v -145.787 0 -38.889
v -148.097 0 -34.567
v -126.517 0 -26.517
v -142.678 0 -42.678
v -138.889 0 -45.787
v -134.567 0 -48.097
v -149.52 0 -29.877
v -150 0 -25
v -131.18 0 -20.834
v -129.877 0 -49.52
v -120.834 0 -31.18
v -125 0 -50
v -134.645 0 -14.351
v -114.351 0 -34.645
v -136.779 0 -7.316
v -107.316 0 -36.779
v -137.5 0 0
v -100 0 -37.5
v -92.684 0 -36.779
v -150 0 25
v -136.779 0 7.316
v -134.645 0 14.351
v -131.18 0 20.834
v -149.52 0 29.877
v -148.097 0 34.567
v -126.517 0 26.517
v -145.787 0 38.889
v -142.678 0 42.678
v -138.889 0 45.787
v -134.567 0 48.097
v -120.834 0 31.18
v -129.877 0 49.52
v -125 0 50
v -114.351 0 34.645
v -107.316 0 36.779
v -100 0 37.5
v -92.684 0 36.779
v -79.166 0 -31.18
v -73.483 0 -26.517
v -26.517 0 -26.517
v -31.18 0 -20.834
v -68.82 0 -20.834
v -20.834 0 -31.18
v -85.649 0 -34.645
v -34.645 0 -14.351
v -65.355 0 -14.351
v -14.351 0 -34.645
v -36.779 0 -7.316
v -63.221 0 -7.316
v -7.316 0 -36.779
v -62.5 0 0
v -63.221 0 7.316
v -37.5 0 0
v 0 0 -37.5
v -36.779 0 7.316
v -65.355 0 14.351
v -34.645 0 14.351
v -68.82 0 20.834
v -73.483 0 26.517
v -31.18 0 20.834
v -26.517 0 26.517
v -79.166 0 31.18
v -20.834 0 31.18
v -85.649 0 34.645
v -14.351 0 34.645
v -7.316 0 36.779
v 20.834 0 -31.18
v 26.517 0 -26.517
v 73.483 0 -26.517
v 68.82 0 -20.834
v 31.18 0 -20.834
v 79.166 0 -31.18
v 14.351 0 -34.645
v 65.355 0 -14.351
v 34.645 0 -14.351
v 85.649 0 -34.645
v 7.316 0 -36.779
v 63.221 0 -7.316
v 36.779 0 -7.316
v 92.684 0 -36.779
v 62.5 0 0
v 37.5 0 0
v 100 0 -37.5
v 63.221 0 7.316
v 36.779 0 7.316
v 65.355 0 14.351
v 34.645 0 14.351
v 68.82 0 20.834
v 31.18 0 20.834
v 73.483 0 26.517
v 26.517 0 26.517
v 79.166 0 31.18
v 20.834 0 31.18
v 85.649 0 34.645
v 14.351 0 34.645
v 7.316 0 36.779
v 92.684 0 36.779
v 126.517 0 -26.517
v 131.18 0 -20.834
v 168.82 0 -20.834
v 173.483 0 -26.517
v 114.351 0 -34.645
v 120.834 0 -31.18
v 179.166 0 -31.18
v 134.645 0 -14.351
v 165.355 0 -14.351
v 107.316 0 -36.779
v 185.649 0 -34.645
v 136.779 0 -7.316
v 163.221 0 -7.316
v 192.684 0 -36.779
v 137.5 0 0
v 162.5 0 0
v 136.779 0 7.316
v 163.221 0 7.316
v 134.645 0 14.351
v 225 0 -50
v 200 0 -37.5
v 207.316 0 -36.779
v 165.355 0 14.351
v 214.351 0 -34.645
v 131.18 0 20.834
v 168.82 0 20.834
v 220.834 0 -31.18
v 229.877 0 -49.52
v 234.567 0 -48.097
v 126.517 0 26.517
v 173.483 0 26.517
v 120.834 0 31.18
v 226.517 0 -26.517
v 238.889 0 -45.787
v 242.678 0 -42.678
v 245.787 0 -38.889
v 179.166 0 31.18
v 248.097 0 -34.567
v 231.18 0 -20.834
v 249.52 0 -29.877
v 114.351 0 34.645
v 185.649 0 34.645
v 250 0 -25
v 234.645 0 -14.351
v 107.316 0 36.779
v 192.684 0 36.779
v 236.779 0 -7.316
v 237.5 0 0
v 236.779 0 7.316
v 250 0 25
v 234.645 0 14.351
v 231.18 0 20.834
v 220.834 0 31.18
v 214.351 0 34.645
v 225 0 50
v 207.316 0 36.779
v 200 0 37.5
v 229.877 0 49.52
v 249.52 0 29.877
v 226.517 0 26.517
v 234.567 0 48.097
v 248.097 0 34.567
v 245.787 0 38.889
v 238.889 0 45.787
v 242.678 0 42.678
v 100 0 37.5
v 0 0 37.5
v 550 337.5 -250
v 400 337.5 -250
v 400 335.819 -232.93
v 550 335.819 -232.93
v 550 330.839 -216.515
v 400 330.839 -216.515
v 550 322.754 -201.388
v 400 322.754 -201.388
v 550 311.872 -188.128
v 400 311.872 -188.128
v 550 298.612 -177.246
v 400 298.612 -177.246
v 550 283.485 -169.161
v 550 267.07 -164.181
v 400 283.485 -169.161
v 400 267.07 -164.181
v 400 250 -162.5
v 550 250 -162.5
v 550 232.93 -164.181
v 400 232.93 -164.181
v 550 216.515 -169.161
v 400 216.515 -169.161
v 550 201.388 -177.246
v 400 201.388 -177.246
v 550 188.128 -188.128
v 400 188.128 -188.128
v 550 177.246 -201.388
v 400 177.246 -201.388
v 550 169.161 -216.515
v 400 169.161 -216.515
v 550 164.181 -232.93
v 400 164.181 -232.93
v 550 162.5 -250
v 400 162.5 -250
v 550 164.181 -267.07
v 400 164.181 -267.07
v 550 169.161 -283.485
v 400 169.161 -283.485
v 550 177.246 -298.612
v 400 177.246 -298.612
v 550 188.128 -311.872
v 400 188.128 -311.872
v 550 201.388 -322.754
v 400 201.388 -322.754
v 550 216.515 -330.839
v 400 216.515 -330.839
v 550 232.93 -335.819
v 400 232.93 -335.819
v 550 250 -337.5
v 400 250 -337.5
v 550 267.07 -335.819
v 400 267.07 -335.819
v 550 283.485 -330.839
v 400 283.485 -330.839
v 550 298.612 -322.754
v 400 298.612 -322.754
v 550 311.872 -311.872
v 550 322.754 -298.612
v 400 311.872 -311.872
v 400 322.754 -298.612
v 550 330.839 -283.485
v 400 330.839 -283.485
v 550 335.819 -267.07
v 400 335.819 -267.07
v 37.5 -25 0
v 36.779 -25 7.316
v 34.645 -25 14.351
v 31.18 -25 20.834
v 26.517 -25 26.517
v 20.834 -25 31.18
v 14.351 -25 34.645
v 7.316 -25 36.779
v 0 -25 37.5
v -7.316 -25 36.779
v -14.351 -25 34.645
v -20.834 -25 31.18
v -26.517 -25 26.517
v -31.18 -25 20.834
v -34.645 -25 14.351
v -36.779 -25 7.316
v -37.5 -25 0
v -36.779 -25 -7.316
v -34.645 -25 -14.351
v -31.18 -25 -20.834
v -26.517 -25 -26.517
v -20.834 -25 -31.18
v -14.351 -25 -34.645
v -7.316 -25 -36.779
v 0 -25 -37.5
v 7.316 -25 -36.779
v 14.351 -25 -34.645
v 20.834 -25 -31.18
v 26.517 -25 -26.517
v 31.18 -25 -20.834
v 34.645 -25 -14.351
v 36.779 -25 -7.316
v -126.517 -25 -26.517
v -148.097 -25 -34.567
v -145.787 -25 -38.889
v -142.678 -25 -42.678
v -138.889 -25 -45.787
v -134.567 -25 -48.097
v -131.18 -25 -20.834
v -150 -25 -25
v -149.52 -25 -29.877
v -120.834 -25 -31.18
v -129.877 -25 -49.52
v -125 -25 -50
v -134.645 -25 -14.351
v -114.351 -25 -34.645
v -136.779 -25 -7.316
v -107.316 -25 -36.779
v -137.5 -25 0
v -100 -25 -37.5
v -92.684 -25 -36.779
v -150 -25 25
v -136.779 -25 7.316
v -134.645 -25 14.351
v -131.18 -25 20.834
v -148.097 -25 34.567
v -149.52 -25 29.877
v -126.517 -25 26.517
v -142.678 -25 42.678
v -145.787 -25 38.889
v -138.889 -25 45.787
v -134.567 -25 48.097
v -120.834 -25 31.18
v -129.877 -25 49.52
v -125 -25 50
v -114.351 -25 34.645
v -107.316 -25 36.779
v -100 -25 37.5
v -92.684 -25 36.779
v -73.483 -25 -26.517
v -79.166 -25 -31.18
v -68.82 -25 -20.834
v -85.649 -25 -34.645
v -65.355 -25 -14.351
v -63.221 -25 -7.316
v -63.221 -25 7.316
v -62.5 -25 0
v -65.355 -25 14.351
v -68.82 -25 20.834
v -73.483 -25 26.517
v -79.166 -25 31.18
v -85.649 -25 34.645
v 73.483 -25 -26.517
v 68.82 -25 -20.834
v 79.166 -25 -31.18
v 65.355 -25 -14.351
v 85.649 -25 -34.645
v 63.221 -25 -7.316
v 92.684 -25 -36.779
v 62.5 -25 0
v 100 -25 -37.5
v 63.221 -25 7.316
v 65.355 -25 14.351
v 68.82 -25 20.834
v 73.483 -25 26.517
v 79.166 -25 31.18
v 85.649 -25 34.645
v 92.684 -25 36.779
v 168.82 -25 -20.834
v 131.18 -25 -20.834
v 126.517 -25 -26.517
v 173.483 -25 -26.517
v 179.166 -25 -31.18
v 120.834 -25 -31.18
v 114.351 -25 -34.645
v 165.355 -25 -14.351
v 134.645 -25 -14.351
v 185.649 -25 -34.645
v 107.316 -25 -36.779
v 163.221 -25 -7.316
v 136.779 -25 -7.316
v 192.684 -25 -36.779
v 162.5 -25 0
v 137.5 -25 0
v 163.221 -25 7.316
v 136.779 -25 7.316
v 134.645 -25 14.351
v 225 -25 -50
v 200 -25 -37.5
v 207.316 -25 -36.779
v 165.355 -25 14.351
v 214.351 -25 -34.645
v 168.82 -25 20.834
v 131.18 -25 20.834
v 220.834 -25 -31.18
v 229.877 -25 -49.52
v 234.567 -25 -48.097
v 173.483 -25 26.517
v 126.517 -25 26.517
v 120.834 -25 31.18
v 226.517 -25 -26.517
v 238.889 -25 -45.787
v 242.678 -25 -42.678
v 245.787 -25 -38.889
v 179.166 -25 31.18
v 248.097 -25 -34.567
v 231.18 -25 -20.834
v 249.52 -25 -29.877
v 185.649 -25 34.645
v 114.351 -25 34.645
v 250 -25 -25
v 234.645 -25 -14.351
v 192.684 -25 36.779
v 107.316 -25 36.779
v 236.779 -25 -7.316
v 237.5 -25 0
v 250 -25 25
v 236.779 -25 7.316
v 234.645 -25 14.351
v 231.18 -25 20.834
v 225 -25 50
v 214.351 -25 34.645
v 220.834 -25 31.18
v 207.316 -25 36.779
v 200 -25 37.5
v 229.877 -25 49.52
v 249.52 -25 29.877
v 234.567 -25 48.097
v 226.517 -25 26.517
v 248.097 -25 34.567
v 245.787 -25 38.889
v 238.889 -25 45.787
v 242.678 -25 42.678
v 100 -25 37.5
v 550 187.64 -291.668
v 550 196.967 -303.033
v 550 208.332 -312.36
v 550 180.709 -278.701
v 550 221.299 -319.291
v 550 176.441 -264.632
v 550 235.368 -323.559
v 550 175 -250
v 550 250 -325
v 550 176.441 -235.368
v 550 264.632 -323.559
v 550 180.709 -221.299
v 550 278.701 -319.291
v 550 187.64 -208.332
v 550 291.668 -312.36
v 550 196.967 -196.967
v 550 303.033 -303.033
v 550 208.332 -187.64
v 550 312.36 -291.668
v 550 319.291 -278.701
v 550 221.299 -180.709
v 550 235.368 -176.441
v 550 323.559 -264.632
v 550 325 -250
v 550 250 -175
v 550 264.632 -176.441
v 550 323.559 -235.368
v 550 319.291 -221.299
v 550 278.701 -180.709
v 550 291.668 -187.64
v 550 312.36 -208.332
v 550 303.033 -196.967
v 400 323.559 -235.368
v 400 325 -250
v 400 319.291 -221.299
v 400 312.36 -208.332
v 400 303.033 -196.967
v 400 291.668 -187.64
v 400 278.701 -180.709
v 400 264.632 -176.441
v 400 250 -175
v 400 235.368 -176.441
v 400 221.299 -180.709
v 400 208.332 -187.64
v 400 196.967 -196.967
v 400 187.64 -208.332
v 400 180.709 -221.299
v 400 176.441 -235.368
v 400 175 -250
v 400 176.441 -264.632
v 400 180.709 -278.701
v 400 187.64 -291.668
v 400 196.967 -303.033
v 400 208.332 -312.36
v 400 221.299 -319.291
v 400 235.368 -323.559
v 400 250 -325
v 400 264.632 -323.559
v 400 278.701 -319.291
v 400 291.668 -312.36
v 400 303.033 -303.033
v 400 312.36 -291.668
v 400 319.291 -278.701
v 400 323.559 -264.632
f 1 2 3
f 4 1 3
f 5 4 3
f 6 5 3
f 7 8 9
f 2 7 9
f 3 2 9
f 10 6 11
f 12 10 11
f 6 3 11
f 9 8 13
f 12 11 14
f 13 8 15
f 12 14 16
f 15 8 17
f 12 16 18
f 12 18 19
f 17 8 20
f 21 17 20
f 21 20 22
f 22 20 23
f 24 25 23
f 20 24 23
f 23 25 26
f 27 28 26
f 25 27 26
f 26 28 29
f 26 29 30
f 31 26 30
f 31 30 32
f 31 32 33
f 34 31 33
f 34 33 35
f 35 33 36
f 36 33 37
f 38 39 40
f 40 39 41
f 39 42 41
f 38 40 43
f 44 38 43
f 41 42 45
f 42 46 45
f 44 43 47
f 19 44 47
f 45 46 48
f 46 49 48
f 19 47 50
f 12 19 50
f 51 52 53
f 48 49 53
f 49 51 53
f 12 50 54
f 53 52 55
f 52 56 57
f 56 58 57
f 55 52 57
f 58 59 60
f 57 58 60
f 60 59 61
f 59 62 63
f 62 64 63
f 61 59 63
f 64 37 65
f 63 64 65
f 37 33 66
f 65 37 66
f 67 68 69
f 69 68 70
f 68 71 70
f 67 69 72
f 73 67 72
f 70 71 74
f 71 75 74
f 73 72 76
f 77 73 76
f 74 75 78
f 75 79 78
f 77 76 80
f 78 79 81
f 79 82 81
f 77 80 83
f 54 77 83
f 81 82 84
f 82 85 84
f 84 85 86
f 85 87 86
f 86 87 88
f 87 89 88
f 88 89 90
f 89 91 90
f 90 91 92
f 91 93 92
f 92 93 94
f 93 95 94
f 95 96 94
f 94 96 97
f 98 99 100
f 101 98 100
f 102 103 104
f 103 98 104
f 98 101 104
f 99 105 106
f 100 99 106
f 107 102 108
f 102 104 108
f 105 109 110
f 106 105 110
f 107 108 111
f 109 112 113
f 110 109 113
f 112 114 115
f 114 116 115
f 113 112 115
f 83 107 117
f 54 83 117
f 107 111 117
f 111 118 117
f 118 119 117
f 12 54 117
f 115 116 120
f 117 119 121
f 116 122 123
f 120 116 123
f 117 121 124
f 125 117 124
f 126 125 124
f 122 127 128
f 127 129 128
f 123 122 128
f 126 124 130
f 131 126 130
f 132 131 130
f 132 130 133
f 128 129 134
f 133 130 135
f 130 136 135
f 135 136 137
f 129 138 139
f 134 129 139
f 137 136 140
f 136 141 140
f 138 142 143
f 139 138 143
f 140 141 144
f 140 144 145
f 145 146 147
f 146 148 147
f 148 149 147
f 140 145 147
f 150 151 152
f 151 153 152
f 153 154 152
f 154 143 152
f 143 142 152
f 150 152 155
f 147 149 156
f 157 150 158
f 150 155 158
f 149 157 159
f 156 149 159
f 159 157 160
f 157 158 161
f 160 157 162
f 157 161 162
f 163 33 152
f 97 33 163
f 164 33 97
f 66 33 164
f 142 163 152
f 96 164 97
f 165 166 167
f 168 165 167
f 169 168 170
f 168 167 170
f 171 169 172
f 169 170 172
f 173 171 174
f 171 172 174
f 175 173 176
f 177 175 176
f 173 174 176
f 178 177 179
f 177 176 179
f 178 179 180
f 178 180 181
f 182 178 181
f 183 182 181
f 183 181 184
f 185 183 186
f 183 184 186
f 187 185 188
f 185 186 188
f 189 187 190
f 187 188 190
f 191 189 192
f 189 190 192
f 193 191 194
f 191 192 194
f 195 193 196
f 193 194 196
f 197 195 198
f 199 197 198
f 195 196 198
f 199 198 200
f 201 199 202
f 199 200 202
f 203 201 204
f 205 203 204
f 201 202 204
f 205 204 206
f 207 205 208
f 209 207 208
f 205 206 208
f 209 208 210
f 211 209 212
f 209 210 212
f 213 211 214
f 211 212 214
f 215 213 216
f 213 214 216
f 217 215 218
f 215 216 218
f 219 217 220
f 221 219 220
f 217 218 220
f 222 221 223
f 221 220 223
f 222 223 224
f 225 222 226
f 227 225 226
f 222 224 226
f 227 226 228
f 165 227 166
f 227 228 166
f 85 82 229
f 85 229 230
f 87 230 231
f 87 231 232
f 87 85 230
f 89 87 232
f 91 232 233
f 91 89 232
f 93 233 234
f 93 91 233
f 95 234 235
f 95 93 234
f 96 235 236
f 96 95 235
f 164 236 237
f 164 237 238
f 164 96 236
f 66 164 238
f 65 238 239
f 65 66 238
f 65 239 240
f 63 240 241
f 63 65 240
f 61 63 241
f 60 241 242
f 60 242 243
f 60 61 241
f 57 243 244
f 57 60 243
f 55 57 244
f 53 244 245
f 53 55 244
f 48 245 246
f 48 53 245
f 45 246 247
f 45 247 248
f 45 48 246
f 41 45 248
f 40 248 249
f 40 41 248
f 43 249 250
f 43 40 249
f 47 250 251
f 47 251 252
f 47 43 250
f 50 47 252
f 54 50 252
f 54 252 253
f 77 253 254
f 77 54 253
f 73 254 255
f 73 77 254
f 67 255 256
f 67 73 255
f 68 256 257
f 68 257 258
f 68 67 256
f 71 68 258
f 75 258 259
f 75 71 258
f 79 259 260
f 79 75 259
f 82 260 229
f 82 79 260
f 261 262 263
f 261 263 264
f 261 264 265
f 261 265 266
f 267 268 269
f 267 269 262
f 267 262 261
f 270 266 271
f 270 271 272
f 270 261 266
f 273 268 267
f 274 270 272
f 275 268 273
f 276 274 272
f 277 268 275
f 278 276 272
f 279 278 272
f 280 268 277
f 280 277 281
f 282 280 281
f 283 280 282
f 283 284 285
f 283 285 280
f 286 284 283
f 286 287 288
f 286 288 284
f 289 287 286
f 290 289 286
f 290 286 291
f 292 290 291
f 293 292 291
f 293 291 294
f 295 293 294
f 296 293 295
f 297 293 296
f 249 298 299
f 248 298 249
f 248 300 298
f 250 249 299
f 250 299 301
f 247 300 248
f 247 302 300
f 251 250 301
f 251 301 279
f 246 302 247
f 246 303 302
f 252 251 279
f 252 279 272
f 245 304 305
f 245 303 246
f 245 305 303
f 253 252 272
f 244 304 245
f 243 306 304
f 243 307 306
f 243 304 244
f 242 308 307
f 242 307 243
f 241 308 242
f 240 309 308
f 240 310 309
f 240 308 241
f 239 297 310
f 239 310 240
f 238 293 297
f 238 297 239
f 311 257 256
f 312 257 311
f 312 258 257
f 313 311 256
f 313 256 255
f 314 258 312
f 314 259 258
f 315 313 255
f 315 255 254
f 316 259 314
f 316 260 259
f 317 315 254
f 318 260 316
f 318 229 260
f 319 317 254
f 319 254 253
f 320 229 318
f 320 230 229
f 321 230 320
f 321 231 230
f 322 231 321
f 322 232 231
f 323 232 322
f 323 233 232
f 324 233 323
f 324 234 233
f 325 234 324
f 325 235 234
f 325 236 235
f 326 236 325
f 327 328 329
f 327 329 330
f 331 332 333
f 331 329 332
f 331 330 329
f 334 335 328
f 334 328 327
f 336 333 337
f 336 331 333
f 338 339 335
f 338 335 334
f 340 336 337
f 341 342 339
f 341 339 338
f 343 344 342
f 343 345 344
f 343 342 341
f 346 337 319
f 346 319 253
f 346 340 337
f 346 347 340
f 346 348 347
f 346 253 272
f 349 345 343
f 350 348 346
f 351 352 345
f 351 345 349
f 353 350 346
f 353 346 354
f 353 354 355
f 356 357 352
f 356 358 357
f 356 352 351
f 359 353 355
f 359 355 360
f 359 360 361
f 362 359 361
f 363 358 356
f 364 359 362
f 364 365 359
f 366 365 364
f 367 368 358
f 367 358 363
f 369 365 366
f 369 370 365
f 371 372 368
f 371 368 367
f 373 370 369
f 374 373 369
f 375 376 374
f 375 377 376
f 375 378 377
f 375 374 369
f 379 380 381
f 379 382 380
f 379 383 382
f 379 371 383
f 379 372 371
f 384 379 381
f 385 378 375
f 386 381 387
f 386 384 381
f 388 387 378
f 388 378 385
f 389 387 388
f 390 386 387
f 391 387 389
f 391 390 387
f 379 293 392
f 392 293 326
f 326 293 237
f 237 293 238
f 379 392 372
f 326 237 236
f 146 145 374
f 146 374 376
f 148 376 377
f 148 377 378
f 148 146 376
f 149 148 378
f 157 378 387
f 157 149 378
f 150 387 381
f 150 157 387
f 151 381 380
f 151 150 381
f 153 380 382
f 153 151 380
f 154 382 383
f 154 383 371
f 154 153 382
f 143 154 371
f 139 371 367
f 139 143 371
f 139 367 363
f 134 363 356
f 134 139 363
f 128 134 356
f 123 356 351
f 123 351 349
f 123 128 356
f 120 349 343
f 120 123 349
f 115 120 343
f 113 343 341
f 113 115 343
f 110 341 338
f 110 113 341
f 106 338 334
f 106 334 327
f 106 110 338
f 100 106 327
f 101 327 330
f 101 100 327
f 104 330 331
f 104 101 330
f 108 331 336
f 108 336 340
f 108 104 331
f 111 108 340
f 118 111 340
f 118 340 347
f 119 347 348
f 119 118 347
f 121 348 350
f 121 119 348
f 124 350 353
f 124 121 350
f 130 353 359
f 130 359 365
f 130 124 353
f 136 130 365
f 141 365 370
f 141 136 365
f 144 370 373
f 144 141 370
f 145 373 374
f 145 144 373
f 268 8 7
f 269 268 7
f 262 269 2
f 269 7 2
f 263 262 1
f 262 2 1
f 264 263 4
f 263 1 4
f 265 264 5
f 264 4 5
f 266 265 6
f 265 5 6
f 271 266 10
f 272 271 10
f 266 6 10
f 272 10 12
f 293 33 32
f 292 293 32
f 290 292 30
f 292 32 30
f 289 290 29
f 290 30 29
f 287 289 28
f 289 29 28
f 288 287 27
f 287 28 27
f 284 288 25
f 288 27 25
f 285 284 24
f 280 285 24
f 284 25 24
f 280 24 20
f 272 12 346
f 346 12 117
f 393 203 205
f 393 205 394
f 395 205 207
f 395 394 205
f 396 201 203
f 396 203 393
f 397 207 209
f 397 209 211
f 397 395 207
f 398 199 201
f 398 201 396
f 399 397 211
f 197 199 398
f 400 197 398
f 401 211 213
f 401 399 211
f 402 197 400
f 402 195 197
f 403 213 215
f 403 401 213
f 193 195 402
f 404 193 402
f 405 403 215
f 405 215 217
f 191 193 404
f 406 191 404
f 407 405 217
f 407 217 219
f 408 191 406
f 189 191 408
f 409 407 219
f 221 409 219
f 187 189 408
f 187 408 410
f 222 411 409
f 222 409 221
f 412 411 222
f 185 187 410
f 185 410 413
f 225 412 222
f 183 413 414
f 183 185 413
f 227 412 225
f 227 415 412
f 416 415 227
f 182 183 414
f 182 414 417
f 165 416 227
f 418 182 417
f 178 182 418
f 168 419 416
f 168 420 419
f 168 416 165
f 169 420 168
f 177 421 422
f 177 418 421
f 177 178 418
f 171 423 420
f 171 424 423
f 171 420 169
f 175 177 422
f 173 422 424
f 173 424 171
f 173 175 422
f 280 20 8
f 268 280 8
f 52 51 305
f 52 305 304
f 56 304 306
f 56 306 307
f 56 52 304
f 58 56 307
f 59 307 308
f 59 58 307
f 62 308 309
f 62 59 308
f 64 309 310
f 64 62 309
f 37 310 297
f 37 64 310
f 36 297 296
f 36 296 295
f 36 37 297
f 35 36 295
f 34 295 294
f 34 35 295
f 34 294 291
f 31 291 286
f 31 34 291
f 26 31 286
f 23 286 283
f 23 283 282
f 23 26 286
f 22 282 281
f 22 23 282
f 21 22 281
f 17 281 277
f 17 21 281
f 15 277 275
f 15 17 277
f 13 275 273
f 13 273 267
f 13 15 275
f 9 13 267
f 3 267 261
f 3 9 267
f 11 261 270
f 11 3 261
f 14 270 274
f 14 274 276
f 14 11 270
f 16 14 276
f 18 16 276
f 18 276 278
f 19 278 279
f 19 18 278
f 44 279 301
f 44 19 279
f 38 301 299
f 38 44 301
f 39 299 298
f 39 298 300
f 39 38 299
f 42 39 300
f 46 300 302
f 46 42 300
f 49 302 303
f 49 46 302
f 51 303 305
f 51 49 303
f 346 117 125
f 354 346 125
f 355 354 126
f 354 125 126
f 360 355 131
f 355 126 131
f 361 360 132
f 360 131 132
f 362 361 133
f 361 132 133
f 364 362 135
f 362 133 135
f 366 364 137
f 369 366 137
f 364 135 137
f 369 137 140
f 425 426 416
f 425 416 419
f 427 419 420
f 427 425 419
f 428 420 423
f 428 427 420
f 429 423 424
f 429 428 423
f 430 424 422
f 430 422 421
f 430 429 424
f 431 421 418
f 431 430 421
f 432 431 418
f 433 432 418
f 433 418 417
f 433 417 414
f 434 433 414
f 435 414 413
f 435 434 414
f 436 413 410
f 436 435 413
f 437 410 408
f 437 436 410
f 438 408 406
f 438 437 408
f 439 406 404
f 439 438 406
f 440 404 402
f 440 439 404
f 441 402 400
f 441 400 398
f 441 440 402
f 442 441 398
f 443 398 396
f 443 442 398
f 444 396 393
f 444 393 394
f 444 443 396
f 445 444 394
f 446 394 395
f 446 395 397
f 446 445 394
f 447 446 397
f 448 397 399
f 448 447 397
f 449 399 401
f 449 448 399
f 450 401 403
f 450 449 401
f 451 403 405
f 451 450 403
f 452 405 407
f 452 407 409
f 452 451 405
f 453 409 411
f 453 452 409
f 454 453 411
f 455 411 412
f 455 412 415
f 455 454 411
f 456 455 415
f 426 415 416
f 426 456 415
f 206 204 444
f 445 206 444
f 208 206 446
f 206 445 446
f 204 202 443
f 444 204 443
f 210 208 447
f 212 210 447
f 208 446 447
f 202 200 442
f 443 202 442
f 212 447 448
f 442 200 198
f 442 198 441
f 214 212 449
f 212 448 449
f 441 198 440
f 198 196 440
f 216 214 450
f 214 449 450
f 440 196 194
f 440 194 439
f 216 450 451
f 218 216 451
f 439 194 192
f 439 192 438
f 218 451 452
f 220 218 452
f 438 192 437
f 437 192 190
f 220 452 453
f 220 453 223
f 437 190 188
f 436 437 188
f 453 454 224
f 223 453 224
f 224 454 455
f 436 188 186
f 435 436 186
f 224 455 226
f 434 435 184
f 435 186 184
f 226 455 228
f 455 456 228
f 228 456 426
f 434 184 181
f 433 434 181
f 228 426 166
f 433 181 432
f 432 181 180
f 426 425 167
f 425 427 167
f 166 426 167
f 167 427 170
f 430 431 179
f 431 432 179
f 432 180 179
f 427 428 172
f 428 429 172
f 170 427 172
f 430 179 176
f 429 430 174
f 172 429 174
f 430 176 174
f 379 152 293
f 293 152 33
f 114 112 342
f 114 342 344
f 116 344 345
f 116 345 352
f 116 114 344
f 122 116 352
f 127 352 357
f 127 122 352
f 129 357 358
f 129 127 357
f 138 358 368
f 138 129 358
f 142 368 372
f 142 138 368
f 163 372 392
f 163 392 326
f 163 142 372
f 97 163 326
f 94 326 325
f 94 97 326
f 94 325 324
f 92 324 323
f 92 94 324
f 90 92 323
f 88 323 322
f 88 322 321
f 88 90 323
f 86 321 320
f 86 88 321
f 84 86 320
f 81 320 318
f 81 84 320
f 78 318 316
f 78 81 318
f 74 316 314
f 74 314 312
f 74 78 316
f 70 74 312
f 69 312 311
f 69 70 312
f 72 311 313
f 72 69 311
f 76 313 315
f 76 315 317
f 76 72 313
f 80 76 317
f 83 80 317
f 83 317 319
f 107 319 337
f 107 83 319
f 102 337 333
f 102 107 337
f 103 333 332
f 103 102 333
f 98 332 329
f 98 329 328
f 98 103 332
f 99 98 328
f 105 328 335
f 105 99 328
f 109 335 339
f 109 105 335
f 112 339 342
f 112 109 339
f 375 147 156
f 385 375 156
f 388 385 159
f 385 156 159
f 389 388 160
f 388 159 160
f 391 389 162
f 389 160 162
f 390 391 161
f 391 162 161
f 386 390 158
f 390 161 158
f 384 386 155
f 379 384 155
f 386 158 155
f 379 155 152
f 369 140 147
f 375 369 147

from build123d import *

# Parameters (mm, degrees)
F0_R     = 37.5
F1_DEPTH = 25
F3_R     = 87.5
F3_R_2   = 75
F4_DEPTH = 150


# Not quite as in the source:
# - the program builds the solid bodies; features that only make, move or delete a surface that nothing else refers to are left out


with BuildPart() as f1:
    # F0 (on Front) → F1 (new body)
    with BuildSketch(Plane.XZ):
        with BuildLine():
            ThreePointArc((250, 25), (242.6776695297, 42.6776695297), (225, 50))
            Line((225, 50), (-125, 50))
            ThreePointArc((-125, 50), (-142.6776695297, 42.6776695297), (-150, 25))
            Line((-150, 25), (-150, -25))
            ThreePointArc((-150, -25), (-142.6776695297, -42.6776695297), (-125, -50))
            Line((-125, -50), (225, -50))
            ThreePointArc((225, -50), (242.6776695297, -42.6776695297), (250, -25))
            Line((250, -25), (250, 25))
        make_face()
        with Locations((-100, 0)):
            Circle(F0_R, mode=Mode.SUBTRACT)
        Circle(F0_R, mode=Mode.SUBTRACT)
        with Locations((100, 0)):
            Circle(F0_R, mode=Mode.SUBTRACT)
        with Locations((200, 0)):
            Circle(F0_R, mode=Mode.SUBTRACT)
    extrude(amount=F1_DEPTH)


with BuildPart() as f4:
    # F3 (on offset) → F4 (new body)
    with BuildSketch(Plane.YZ.offset(400)):
        with Locations((250, -250)):
            Circle(F3_R)
        with Locations((250, -250)):
            Circle(F3_R_2, mode=Mode.SUBTRACT)
    extrude(amount=F4_DEPTH)


solid = Compound([f1.part, f4.part])
